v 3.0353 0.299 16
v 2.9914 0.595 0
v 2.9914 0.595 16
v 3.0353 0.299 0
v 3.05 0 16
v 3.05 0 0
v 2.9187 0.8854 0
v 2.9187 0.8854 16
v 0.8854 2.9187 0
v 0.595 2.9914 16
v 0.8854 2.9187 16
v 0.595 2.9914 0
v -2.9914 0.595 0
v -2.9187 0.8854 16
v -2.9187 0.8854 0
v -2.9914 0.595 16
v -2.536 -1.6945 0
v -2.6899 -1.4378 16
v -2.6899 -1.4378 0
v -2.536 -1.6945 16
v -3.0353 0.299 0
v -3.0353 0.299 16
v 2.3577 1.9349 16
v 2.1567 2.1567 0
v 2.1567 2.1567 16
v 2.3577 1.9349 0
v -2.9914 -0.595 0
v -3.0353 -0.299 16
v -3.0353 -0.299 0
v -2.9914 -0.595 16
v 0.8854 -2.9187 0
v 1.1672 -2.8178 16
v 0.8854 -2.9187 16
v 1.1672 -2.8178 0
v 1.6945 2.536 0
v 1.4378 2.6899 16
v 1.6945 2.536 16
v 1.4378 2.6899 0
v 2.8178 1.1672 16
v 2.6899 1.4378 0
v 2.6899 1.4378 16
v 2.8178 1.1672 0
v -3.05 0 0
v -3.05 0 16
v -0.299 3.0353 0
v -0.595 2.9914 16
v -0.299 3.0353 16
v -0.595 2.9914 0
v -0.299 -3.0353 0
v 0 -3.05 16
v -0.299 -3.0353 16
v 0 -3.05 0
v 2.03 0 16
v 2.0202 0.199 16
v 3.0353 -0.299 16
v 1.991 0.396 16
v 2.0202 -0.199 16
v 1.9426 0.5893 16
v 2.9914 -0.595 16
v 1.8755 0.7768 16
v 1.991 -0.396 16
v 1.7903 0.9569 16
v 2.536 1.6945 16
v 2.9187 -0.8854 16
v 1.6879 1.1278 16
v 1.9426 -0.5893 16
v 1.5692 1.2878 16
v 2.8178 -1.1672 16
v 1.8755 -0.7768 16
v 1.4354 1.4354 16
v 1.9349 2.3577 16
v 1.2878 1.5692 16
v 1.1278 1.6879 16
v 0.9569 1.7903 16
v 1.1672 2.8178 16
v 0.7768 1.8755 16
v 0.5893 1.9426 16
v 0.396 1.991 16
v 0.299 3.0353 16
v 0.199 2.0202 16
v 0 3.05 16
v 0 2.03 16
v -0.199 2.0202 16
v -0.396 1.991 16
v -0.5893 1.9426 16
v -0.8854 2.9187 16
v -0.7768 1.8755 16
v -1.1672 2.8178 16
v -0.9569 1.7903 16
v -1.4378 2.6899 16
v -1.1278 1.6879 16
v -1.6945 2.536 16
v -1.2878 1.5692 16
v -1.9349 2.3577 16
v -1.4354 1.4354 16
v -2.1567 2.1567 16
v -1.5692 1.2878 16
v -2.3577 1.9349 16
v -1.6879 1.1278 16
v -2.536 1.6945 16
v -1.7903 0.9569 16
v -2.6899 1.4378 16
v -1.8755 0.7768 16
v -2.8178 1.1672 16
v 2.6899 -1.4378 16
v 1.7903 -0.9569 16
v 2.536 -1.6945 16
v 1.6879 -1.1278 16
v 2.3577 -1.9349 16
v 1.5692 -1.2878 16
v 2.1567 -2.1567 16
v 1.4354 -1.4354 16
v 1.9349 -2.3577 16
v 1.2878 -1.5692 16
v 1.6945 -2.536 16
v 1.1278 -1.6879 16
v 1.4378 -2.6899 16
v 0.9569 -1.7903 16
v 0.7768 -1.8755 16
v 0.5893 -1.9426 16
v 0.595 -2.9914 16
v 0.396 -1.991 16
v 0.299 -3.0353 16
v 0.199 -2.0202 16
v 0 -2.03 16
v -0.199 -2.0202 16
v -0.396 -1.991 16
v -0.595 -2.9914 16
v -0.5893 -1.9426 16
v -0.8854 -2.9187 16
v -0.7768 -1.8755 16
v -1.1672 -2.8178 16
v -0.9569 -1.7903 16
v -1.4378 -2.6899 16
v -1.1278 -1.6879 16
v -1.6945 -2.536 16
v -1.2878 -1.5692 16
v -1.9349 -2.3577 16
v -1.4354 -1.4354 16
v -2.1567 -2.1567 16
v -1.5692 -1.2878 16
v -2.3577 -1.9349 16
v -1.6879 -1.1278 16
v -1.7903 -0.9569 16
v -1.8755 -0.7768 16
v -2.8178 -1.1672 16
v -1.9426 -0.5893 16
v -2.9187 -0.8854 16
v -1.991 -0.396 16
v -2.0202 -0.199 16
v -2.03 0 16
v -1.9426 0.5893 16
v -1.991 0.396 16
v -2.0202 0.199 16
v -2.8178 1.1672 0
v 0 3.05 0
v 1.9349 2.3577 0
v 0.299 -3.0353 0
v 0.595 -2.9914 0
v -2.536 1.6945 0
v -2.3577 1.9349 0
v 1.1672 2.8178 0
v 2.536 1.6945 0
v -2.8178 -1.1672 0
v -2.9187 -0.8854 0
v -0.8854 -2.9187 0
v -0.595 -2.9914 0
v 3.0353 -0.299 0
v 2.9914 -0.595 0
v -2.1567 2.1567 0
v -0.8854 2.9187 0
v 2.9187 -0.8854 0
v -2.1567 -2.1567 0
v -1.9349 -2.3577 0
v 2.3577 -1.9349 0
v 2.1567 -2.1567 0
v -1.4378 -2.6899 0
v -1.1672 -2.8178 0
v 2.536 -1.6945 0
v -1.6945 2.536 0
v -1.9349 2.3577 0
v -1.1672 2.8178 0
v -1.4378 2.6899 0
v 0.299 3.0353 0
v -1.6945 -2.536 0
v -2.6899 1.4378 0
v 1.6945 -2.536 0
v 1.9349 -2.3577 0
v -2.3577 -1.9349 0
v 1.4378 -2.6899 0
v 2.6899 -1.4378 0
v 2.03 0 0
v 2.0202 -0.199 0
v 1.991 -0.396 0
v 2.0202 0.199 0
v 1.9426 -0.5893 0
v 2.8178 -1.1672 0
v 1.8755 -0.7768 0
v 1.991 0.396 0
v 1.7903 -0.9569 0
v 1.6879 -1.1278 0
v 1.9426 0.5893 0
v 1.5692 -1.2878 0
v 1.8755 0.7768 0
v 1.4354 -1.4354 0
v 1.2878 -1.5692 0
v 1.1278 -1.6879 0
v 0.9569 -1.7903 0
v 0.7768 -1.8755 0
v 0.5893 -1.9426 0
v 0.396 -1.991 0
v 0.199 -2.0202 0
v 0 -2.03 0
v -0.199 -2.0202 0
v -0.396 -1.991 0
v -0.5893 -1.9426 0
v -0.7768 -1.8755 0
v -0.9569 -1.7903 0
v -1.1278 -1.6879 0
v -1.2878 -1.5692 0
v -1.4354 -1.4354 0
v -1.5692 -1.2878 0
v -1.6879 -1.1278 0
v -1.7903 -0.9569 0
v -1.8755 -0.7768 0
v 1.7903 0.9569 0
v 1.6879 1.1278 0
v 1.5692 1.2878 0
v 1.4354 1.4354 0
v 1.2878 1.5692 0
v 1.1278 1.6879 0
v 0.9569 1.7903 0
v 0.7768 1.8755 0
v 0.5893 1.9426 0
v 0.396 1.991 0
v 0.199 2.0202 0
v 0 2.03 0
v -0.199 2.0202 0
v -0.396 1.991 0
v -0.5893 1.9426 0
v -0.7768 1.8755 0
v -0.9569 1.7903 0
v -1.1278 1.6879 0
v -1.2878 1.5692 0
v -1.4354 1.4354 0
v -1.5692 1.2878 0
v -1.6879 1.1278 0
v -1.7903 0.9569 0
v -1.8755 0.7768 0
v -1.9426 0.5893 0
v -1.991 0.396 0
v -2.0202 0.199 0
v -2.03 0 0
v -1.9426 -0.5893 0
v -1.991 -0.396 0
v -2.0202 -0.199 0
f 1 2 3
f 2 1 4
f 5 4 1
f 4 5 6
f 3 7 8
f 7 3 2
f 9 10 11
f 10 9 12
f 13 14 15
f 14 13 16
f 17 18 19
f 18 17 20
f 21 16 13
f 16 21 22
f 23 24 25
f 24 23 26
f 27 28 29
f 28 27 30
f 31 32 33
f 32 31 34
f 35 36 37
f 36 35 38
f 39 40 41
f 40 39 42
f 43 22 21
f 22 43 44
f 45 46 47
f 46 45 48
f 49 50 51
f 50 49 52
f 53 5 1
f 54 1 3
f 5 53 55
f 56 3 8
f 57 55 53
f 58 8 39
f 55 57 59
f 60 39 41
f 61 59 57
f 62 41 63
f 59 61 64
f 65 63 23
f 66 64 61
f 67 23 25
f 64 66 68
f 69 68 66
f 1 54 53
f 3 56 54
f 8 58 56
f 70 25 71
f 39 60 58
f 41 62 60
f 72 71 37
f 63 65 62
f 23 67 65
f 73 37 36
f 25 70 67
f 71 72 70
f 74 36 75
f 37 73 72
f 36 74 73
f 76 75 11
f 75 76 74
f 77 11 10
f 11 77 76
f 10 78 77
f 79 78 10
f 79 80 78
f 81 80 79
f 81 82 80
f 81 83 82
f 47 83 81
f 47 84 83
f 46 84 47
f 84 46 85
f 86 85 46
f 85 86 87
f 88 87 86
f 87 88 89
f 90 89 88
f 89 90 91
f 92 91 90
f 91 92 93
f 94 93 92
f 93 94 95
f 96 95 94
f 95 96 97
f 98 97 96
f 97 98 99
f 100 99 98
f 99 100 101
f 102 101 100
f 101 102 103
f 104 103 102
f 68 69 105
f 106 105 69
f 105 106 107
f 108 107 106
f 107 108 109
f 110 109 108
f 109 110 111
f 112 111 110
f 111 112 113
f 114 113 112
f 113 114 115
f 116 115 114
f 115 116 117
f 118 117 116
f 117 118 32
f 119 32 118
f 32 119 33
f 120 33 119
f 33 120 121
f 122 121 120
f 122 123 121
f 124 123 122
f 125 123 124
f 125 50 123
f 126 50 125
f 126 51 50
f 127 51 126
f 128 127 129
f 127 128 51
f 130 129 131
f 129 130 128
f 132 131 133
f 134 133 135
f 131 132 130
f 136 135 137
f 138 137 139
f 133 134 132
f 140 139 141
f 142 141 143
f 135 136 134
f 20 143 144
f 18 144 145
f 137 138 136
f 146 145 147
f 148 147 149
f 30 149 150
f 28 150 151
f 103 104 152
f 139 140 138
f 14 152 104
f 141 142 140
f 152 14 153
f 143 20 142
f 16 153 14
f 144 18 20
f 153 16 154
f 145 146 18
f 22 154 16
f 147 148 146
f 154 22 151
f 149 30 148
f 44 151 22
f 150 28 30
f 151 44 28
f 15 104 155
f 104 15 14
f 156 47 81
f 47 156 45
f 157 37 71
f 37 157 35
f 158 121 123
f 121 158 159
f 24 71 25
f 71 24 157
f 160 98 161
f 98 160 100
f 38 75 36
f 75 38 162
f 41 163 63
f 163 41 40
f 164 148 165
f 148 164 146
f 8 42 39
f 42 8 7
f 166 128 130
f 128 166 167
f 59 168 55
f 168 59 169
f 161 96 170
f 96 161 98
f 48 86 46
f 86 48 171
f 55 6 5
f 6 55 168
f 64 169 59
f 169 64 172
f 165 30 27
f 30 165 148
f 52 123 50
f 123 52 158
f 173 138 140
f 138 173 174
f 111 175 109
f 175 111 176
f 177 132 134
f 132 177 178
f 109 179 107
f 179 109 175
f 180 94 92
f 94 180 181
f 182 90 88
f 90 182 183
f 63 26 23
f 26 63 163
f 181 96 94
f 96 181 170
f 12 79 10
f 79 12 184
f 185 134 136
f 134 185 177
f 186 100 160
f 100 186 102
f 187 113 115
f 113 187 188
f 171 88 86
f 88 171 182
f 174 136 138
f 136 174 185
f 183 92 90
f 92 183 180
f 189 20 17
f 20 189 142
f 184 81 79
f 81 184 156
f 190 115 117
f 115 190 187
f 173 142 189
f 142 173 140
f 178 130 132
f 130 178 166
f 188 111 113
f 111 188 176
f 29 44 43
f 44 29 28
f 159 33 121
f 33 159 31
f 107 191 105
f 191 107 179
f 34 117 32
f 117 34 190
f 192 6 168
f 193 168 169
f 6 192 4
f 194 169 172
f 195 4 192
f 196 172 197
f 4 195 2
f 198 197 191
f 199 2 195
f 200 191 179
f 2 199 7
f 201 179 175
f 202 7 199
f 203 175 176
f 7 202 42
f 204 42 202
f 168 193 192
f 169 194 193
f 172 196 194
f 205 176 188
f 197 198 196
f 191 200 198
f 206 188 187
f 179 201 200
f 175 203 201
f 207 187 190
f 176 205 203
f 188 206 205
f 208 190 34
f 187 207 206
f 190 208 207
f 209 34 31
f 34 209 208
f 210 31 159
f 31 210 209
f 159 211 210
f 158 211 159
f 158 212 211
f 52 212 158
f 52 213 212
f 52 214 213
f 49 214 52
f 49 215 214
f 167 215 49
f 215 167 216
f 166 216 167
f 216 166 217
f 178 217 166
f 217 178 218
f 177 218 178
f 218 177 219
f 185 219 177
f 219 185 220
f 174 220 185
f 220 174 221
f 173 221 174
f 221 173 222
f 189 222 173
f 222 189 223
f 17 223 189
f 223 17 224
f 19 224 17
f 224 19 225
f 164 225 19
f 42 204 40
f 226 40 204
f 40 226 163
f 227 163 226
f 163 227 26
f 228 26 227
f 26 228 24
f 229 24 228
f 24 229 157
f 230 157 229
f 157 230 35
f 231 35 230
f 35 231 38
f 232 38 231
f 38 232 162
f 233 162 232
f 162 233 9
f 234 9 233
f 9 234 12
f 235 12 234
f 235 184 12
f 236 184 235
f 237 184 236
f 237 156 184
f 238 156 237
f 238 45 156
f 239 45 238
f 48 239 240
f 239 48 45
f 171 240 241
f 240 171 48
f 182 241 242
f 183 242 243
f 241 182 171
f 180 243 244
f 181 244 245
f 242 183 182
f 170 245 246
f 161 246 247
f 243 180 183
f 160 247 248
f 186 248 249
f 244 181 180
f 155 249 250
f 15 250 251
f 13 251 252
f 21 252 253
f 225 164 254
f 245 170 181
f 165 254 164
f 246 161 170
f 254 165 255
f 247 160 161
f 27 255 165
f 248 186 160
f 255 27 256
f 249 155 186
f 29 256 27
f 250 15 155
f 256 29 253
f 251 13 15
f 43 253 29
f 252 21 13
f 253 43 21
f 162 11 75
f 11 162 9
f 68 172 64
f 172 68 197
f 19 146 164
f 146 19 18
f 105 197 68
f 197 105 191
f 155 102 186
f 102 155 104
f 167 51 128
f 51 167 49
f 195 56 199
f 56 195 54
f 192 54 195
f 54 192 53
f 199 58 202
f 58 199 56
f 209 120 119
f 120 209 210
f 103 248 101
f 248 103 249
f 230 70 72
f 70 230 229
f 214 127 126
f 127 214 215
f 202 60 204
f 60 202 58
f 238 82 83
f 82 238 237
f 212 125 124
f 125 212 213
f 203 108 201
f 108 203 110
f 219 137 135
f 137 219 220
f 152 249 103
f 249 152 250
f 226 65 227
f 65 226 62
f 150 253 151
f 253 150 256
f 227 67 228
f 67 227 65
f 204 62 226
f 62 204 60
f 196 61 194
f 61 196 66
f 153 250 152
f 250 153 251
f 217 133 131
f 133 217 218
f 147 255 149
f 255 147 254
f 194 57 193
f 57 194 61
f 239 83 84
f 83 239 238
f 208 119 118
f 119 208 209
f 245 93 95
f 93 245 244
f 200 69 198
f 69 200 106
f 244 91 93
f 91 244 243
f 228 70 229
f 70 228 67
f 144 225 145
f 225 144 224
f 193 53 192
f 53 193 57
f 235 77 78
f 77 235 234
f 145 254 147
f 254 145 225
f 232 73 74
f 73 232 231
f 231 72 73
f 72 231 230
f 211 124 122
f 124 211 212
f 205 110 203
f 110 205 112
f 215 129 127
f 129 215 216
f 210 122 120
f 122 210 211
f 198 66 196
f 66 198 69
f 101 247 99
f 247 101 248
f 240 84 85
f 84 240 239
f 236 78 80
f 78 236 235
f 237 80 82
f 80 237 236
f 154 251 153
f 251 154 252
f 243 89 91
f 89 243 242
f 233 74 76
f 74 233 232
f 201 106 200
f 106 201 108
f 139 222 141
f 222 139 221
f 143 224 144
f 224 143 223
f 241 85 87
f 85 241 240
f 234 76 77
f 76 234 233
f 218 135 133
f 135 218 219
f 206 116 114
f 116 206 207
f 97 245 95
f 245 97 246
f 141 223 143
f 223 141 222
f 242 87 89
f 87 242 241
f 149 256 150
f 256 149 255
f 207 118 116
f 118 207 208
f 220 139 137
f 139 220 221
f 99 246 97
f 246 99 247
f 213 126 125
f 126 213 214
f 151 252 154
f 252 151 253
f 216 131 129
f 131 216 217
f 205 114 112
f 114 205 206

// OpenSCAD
// file: header.scad
////These are used to shorten the names of the constantly called primative actions, since most primitives are translated, they combine the translate action in one declaration.

////INTERSECTION MODULE////
//http://forum.openscad.org/intersection-children-0-children-1-does-a-union-instead-of-an-intersection-td8998.html
module i(){
    intersection_for(i=[0:$children-1]){
        children(i);
    }
}

////UNION MODULE////
module u(){
    union(){
        children([0:$children-1]);
    }
}
///DIFFERENCE MODULE////
module d(){
    difference(){
        children(0);
        children([1:$children-1]);
    }
}
////HULL MODULE////
module h(){
    hull(){
        children([0:$children-1]);
    }
}
////LINEAR_EXRTRUDE MODULE////
module e(z){
    linear_extrude(z)children();
}
////TRANSLATE MODULE////
module t(x,y,z){
//many of the primatives are not translated these operations allow leaving off the x,y,z in the cube, cylinder, square, circle, and torus modules below  
    if(x==undef){children();}
    else{
        //if x is defined (we assume y is too) but not z we translate in 2D
        if(z==undef)translate([x,y])children();
        //If z is defined we translate in 3D
        else translate([x,y,z])children();
        }
}

////CIRCLE MODULE////
module c(r,x,y){
    t(x,y)circle(r=r,$fn=64);
}

////SQUARE MODULE////
module s(h,w,x,y){
    t(x,y)square([h,w]);
}

////ROTATE MODULE////
module r(x){
    rotate(x)children();
}

////TORRUS MODULE////
module o(i,o,x,y,z){
    t(x,y,z) rotate_extrude($fn=64)
    t(i+(o-i)/2,0,0)c((o-i)/2);
    //t(i+(o-i)/2,0,0)c((o-i+.001)/2);
    //"+.001" in the line fixes "Object may not be a valid 2-manifold and may need repair!" error in Frame, but the STL seems fine according to Meshlab and Cura and 5 characters is 5 characters.
}

////COPY-MIRROR MODULE////
module m(v){
    children();
    mirror(v)children();
}
////CUBE MODULE////
module q(h,w,l,x,y,z){
    t(x,y,z)cube([h,w,l]);
}

////CYLINDER MODULE////
module l(r,h,x,y,z){
    t(x,y,z)cylinder(r=r,h=h,$fn=64);
}

////MINKOWSKI MODULE////
module w(r,f){
    minkowski(){
        children();
        sphere(r=r,$fn=f);
    }
}
// main file
include<header.scad>;
d(){
    l(3.05,16);
    l(2.03,16);
}
